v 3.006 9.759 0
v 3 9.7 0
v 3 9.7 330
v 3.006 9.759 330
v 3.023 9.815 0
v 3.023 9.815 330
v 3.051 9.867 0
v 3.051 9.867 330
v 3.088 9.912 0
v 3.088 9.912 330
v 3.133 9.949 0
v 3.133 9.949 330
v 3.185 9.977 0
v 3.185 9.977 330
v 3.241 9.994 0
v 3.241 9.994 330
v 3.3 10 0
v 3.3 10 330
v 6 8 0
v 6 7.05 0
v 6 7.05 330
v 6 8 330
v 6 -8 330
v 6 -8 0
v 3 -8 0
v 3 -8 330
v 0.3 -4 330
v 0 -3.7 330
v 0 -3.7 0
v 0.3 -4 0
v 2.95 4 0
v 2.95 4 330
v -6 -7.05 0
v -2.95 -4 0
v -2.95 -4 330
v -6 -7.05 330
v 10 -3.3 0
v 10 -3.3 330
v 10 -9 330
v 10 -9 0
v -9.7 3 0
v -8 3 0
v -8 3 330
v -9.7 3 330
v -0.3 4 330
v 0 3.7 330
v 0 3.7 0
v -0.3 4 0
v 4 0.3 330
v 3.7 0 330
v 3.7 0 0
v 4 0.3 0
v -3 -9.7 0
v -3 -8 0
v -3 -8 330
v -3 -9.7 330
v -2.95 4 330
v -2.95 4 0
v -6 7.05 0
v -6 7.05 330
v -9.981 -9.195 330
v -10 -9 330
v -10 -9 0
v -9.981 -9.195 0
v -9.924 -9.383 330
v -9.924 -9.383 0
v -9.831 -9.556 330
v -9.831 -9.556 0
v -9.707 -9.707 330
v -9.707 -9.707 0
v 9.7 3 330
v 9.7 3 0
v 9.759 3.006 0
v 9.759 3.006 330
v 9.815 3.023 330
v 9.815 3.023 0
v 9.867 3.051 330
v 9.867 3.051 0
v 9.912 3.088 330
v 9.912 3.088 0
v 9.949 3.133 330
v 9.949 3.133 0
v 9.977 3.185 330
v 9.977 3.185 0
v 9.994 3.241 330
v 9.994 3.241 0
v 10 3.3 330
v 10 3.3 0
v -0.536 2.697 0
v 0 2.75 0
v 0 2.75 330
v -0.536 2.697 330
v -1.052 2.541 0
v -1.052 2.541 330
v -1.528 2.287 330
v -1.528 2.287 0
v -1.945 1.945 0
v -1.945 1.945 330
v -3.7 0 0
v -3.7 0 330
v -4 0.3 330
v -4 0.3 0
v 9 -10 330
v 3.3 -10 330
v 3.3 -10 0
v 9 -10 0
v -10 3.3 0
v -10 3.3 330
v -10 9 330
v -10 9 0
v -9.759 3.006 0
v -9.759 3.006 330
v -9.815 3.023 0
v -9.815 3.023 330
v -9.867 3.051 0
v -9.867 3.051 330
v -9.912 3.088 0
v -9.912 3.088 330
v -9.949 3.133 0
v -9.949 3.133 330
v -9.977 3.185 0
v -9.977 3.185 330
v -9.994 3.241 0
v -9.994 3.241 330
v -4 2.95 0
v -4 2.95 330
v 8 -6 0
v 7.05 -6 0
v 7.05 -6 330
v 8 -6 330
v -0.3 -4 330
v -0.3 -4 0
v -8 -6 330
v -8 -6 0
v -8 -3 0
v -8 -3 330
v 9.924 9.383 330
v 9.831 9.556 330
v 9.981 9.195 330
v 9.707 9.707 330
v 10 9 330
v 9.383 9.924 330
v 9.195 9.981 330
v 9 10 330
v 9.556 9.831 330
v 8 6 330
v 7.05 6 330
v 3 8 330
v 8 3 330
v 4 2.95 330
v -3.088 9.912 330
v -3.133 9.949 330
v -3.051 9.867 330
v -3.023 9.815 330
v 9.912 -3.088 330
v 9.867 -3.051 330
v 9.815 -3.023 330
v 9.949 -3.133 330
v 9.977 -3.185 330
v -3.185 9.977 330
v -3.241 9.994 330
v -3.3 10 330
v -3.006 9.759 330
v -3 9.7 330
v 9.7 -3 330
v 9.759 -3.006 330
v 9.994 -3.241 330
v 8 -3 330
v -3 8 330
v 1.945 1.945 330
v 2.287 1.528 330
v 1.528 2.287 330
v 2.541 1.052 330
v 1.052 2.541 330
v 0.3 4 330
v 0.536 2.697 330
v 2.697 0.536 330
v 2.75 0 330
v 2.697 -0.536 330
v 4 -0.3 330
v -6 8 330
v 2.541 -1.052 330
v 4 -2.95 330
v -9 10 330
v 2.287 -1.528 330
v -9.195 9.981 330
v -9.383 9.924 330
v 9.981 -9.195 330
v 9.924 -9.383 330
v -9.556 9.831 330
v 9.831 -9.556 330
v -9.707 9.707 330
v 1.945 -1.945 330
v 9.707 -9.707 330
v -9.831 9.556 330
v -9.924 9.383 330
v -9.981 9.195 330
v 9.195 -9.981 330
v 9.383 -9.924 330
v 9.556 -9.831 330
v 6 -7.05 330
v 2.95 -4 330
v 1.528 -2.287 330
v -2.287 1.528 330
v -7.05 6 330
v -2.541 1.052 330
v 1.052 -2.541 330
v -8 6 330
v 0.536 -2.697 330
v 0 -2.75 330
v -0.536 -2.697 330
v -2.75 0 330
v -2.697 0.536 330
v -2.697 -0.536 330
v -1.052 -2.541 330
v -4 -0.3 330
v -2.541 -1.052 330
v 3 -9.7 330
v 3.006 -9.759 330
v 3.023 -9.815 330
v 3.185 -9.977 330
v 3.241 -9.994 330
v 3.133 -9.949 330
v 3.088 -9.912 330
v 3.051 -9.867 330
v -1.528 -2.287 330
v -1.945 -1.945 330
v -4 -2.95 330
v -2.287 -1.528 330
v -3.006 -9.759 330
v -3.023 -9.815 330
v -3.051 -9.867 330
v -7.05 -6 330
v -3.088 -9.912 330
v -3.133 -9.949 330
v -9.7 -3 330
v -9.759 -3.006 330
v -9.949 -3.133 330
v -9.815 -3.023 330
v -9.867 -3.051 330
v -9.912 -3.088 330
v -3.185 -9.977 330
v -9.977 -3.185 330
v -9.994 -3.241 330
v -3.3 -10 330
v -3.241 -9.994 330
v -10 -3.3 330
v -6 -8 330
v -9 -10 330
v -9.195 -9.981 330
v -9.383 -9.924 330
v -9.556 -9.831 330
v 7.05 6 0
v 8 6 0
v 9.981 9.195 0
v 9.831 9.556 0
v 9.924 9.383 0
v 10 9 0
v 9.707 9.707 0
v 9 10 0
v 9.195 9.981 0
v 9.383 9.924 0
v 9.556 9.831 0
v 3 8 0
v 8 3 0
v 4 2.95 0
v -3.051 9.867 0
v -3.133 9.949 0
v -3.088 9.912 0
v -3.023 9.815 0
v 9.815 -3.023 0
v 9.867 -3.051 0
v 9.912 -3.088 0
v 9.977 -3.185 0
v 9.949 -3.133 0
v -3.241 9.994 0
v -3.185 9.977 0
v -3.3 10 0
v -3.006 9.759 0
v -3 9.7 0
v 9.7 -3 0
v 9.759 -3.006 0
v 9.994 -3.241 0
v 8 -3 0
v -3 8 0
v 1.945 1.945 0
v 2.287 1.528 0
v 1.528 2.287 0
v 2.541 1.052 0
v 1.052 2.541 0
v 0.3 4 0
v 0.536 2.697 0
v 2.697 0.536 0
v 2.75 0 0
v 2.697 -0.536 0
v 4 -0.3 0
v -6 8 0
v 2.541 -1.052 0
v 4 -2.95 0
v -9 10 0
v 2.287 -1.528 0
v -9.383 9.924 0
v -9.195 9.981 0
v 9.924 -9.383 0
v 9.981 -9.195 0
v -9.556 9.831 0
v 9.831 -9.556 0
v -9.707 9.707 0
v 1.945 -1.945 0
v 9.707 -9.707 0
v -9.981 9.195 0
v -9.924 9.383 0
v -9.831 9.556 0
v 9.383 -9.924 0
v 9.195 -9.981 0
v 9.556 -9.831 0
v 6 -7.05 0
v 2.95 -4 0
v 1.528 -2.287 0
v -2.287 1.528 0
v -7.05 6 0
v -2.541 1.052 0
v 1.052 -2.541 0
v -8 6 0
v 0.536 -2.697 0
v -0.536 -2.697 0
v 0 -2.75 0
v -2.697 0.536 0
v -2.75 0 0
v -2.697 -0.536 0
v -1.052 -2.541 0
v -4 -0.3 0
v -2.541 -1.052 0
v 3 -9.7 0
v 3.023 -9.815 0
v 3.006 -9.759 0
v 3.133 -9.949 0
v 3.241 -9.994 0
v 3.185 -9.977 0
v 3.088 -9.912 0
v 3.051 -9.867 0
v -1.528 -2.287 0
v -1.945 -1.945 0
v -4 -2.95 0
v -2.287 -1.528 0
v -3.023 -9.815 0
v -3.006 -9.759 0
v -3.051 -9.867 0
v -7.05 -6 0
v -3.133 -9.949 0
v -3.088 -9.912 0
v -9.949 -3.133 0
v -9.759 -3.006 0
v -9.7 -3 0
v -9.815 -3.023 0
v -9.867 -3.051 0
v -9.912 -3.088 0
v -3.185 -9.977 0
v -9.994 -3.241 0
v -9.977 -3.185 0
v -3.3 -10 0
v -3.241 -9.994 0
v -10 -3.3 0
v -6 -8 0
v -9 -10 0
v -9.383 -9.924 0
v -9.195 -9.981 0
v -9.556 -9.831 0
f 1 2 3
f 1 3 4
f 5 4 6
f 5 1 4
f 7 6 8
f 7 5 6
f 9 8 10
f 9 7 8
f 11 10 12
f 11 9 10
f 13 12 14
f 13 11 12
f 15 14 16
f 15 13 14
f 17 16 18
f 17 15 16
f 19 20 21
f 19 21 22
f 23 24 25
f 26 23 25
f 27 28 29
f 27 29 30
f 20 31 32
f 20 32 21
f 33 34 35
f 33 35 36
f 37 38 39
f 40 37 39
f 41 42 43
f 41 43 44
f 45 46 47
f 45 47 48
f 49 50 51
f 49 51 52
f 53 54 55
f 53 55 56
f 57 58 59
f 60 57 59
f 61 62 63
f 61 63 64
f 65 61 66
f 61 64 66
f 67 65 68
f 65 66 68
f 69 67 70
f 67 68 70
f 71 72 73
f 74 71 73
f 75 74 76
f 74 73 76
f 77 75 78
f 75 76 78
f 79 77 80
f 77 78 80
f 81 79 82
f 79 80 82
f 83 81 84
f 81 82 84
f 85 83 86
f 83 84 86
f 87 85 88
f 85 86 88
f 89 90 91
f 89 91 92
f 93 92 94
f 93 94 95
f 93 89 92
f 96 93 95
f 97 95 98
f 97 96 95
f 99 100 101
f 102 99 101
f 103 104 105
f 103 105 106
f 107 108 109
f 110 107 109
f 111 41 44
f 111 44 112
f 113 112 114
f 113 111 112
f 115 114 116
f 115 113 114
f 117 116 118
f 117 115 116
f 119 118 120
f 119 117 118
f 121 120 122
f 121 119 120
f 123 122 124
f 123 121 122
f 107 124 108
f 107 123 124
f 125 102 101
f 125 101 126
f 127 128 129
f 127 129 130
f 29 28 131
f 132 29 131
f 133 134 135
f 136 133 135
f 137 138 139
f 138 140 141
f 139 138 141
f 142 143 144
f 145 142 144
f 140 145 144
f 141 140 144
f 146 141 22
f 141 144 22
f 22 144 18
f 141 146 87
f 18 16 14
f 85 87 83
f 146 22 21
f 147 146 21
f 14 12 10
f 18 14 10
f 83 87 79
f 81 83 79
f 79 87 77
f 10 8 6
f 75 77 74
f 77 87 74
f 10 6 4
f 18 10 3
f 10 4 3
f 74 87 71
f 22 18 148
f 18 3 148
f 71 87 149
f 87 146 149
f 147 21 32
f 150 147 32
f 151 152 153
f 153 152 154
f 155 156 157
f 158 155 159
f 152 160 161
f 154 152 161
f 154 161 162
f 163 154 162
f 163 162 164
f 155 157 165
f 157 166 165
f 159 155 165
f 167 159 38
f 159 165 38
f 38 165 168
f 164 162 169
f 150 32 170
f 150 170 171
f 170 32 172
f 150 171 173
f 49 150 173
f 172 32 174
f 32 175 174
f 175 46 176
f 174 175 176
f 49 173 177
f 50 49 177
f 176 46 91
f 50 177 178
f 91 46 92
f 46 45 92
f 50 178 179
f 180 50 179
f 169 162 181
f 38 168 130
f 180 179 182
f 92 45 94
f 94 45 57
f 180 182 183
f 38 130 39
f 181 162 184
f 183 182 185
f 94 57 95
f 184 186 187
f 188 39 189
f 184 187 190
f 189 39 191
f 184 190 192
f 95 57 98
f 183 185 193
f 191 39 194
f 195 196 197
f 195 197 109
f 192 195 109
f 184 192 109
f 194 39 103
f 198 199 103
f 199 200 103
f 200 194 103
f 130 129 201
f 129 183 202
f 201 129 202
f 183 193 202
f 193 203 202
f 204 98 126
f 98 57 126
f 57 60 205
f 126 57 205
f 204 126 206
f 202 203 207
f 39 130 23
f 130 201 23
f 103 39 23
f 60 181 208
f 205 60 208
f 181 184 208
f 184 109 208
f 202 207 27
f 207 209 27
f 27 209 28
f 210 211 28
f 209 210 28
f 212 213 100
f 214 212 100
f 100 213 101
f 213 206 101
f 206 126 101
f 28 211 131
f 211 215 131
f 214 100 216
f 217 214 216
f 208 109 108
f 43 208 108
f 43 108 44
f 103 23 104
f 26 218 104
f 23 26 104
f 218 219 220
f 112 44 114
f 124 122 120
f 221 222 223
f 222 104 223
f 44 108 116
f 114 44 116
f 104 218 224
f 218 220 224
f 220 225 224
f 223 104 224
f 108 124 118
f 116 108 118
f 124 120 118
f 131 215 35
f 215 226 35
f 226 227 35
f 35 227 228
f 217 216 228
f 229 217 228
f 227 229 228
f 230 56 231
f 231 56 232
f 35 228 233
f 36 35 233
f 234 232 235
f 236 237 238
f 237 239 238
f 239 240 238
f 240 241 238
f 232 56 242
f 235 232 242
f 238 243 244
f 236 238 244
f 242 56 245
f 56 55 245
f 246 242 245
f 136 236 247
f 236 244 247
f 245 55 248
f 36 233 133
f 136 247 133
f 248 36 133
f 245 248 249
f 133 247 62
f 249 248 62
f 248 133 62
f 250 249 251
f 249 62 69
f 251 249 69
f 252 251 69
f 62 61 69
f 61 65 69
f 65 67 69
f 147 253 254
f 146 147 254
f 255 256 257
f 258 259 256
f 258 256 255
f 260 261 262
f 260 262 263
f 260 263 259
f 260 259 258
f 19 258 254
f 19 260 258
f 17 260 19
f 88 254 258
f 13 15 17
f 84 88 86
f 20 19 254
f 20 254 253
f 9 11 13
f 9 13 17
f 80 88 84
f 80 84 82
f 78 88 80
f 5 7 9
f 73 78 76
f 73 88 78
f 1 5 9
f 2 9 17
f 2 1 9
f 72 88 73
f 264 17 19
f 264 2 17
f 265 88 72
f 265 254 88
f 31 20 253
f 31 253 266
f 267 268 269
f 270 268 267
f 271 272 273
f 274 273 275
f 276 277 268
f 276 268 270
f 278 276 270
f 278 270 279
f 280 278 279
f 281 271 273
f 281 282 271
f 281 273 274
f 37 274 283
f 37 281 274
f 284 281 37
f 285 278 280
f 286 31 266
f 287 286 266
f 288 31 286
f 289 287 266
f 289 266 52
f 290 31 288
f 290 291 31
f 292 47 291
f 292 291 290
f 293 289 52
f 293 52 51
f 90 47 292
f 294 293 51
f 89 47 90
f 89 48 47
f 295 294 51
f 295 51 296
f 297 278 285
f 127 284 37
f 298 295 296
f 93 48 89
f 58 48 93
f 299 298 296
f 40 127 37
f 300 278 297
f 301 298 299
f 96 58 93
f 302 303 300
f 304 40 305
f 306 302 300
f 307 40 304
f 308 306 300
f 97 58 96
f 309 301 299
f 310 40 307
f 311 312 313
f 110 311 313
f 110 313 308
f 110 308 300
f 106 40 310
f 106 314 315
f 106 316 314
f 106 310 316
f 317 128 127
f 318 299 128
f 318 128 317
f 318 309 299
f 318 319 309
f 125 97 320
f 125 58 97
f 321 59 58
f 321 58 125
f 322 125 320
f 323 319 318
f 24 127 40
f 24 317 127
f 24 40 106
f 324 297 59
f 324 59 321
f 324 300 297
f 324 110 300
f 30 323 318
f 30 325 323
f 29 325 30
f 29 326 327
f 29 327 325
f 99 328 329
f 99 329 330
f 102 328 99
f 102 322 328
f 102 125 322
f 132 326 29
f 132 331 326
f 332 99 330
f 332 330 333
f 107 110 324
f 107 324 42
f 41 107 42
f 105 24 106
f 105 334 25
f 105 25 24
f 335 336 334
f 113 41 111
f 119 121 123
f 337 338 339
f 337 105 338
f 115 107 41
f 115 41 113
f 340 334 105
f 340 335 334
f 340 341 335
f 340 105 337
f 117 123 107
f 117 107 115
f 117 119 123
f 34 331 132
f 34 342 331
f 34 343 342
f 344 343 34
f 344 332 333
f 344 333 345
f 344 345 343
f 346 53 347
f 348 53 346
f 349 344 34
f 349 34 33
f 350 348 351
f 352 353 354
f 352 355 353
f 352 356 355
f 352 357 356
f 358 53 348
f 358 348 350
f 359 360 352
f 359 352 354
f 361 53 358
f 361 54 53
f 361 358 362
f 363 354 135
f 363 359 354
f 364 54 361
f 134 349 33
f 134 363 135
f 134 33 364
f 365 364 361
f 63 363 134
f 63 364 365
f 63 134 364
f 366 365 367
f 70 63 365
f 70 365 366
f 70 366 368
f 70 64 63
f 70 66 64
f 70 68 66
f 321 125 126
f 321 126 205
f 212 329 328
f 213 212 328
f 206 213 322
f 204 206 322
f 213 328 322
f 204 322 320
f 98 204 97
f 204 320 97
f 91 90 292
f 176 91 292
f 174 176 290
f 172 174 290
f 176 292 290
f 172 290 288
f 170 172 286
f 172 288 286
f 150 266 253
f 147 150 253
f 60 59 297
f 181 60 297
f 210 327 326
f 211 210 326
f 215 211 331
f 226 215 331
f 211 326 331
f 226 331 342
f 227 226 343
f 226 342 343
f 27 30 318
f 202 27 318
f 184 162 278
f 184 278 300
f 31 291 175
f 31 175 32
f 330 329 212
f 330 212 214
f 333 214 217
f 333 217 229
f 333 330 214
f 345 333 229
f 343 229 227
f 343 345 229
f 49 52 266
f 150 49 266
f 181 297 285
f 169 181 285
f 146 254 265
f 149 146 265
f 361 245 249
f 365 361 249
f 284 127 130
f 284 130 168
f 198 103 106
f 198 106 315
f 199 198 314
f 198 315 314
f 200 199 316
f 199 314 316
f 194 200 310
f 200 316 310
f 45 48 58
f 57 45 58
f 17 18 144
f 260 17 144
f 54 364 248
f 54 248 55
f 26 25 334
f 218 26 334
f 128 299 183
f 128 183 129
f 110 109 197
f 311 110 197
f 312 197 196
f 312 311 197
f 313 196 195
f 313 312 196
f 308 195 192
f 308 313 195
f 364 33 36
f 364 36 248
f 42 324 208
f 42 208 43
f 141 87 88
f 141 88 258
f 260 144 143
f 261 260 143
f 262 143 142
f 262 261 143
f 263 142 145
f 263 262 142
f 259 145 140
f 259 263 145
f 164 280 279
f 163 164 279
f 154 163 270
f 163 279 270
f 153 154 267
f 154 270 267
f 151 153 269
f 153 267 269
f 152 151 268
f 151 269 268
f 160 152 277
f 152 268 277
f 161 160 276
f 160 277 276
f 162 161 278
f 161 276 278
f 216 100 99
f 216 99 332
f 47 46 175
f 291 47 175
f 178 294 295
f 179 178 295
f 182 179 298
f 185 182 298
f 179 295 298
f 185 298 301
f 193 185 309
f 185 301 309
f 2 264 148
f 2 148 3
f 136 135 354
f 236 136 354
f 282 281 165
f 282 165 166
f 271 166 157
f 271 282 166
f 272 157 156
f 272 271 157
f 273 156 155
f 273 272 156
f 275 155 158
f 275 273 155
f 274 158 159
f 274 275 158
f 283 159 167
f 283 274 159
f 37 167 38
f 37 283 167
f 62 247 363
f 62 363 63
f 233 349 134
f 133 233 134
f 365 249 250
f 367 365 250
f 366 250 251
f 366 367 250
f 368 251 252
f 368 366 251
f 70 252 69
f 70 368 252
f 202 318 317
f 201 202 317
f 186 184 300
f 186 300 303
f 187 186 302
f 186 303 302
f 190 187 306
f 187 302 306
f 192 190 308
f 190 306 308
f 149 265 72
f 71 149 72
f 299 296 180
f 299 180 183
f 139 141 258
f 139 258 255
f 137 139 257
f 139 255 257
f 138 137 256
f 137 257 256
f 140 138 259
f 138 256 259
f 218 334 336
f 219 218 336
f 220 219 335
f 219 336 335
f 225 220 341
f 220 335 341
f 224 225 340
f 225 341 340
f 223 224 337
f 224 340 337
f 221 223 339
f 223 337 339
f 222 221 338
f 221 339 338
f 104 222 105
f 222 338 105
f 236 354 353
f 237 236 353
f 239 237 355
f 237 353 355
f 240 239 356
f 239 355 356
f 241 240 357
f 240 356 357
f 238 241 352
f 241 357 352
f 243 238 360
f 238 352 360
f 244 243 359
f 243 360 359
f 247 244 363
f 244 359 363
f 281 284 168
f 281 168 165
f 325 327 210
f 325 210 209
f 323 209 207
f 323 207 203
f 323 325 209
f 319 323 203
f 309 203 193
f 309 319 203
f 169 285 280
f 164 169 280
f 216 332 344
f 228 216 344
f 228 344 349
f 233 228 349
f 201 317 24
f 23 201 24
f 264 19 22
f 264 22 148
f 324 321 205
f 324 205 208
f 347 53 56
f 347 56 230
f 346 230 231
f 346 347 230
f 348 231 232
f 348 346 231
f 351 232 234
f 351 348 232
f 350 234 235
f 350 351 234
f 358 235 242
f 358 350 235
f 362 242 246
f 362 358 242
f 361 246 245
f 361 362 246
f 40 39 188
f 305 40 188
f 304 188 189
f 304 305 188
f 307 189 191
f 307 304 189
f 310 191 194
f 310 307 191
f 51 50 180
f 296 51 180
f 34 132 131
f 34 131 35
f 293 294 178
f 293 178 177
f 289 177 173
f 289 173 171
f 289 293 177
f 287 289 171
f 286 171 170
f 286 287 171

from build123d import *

# Parameters (mm, degrees)
PAD_DEPTH                          = 330
PAD_MIRRORED_2_DEPTH               = 330
PAD_MIRRORED001_2_DEPTH            = 330
PAD_MIRRORED_2_MIRRORED001_2_DEPTH = 330


with BuildPart() as part:
    # Sketch → Pad (new body)
    with BuildSketch(Plane.XY):
        with BuildLine():
            Line((-3.7, 0), (-4, -0.3))
            Line((-4, -0.3), (-4, -2.95))
            Line((-4, -2.95), (-7.05, -6))
            Line((-7.05, -6), (-8, -6))
            Line((-8, -6), (-8, -3))
            Line((-8, -3), (-9.7, -3))
            ThreePointArc((-9.7, -3), (-9.912132, -3.087868), (-10, -3.3))
            Line((-10, -3.3), (-10, -9))
            ThreePointArc((-10, -9), (-9.92388, -9.382683), (-9.707107, -9.707107))
            Line((-1.944544, -1.944544), (-9.707107, -9.707107))
            ThreePointArc((-2.75, 0), (-2.540669, -1.052379), (-1.944544, -1.944544))
            Line((-3.7, 0), (-2.75, 0))
        make_face()
    pad = extrude(amount=PAD_DEPTH)

    # Sketch Mirrored 2 → Pad Mirrored 2 (add)
    with BuildSketch(Plane.YX):
        with BuildLine():
            Line((-3.7, 0), (-4, -0.3))
            Line((-4, -0.3), (-4, -2.95))
            Line((-4, -2.95), (-7.05, -6))
            Line((-7.05, -6), (-8, -6))
            Line((-8, -6), (-8, -3))
            Line((-8, -3), (-9.7, -3))
            ThreePointArc((-9.7, -3), (-9.912132, -3.087868), (-10, -3.3))
            Line((-10, -3.3), (-10, -9))
            ThreePointArc((-10, -9), (-9.92388, -9.382683), (-9.707107, -9.707107))
            Line((-1.944544, -1.944544), (-9.707107, -9.707107))
            ThreePointArc((-2.75, 0), (-2.540669, -1.052379), (-1.944544, -1.944544))
            Line((-3.7, 0), (-2.75, 0))
        make_face()
    pad_mirrored_2 = extrude(amount=-PAD_MIRRORED_2_DEPTH)

    # Sketch Mirrored001 2 → Pad Mirrored001 2 (add)
    with BuildSketch(Plane(origin=(0, 0, 0), x_dir=(-1, 0, 0), z_dir=(0, 0, -1))):
        with BuildLine():
            Line((-3.7, 0), (-4, -0.3))
            Line((-4, -0.3), (-4, -2.95))
            Line((-4, -2.95), (-7.05, -6))
            Line((-7.05, -6), (-8, -6))
            Line((-8, -6), (-8, -3))
            Line((-8, -3), (-9.7, -3))
            ThreePointArc((-9.7, -3), (-9.912132, -3.087868), (-10, -3.3))
            Line((-10, -3.3), (-10, -9))
            ThreePointArc((-10, -9), (-9.92388, -9.382683), (-9.707107, -9.707107))
            Line((-1.944544, -1.944544), (-9.707107, -9.707107))
            ThreePointArc((-2.75, 0), (-2.540669, -1.052379), (-1.944544, -1.944544))
            Line((-3.7, 0), (-2.75, 0))
        make_face()
    pad_mirrored001_2 = extrude(amount=-PAD_MIRRORED001_2_DEPTH)

    # Sketch Mirrored 2 Mirrored001 2 → Pad Mirrored 2 Mirrored001 2 (add)
    with BuildSketch(Plane(origin=(0, 0, 0), x_dir=(0, 1, 0), z_dir=(0, 0, 1))):
        with BuildLine():
            Line((-3.7, 0), (-4, -0.3))
            Line((-4, -0.3), (-4, -2.95))
            Line((-4, -2.95), (-7.05, -6))
            Line((-7.05, -6), (-8, -6))
            Line((-8, -6), (-8, -3))
            Line((-8, -3), (-9.7, -3))
            ThreePointArc((-9.7, -3), (-9.912132, -3.087868), (-10, -3.3))
            Line((-10, -3.3), (-10, -9))
            ThreePointArc((-10, -9), (-9.92388, -9.382683), (-9.707107, -9.707107))
            Line((-1.944544, -1.944544), (-9.707107, -9.707107))
            ThreePointArc((-2.75, 0), (-2.540669, -1.052379), (-1.944544, -1.944544))
            Line((-3.7, 0), (-2.75, 0))
        make_face()
    pad_mirrored_2_mirrored001_2 = extrude(amount=PAD_MIRRORED_2_MIRRORED001_2_DEPTH)

    # Mirrored002: Pad, Pad Mirrored 2, Pad Mirrored001 2, Pad Mirrored 2 Mirrored001 2 across Sketch H_Axis
    add(pad.mirror(Plane.ZX))
    add(pad_mirrored_2.mirror(Plane.ZX))
    add(pad_mirrored001_2.mirror(Plane.ZX))
    add(pad_mirrored_2_mirrored001_2.mirror(Plane.ZX))


solid = part.part
